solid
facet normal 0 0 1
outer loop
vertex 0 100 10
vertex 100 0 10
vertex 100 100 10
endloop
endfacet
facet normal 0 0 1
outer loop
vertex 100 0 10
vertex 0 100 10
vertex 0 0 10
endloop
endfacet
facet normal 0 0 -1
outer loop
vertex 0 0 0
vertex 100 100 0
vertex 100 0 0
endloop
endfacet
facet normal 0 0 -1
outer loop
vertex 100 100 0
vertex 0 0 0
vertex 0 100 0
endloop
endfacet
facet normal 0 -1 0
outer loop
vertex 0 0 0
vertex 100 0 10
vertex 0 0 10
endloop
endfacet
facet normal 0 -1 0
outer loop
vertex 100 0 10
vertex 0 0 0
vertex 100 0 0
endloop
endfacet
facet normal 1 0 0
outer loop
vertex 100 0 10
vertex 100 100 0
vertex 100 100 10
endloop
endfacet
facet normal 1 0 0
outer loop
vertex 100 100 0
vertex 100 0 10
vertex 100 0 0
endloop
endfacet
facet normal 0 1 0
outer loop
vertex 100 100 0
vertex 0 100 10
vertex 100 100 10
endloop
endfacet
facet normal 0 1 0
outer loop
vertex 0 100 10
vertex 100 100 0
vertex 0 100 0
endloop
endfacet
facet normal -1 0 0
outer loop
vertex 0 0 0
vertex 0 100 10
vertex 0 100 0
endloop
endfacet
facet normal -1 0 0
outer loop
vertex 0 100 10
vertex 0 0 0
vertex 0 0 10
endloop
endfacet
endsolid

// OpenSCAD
//cube([50, 50, 50], center = true);
//cube([50, 50, 50]);
cube([100, 100, 10]);
